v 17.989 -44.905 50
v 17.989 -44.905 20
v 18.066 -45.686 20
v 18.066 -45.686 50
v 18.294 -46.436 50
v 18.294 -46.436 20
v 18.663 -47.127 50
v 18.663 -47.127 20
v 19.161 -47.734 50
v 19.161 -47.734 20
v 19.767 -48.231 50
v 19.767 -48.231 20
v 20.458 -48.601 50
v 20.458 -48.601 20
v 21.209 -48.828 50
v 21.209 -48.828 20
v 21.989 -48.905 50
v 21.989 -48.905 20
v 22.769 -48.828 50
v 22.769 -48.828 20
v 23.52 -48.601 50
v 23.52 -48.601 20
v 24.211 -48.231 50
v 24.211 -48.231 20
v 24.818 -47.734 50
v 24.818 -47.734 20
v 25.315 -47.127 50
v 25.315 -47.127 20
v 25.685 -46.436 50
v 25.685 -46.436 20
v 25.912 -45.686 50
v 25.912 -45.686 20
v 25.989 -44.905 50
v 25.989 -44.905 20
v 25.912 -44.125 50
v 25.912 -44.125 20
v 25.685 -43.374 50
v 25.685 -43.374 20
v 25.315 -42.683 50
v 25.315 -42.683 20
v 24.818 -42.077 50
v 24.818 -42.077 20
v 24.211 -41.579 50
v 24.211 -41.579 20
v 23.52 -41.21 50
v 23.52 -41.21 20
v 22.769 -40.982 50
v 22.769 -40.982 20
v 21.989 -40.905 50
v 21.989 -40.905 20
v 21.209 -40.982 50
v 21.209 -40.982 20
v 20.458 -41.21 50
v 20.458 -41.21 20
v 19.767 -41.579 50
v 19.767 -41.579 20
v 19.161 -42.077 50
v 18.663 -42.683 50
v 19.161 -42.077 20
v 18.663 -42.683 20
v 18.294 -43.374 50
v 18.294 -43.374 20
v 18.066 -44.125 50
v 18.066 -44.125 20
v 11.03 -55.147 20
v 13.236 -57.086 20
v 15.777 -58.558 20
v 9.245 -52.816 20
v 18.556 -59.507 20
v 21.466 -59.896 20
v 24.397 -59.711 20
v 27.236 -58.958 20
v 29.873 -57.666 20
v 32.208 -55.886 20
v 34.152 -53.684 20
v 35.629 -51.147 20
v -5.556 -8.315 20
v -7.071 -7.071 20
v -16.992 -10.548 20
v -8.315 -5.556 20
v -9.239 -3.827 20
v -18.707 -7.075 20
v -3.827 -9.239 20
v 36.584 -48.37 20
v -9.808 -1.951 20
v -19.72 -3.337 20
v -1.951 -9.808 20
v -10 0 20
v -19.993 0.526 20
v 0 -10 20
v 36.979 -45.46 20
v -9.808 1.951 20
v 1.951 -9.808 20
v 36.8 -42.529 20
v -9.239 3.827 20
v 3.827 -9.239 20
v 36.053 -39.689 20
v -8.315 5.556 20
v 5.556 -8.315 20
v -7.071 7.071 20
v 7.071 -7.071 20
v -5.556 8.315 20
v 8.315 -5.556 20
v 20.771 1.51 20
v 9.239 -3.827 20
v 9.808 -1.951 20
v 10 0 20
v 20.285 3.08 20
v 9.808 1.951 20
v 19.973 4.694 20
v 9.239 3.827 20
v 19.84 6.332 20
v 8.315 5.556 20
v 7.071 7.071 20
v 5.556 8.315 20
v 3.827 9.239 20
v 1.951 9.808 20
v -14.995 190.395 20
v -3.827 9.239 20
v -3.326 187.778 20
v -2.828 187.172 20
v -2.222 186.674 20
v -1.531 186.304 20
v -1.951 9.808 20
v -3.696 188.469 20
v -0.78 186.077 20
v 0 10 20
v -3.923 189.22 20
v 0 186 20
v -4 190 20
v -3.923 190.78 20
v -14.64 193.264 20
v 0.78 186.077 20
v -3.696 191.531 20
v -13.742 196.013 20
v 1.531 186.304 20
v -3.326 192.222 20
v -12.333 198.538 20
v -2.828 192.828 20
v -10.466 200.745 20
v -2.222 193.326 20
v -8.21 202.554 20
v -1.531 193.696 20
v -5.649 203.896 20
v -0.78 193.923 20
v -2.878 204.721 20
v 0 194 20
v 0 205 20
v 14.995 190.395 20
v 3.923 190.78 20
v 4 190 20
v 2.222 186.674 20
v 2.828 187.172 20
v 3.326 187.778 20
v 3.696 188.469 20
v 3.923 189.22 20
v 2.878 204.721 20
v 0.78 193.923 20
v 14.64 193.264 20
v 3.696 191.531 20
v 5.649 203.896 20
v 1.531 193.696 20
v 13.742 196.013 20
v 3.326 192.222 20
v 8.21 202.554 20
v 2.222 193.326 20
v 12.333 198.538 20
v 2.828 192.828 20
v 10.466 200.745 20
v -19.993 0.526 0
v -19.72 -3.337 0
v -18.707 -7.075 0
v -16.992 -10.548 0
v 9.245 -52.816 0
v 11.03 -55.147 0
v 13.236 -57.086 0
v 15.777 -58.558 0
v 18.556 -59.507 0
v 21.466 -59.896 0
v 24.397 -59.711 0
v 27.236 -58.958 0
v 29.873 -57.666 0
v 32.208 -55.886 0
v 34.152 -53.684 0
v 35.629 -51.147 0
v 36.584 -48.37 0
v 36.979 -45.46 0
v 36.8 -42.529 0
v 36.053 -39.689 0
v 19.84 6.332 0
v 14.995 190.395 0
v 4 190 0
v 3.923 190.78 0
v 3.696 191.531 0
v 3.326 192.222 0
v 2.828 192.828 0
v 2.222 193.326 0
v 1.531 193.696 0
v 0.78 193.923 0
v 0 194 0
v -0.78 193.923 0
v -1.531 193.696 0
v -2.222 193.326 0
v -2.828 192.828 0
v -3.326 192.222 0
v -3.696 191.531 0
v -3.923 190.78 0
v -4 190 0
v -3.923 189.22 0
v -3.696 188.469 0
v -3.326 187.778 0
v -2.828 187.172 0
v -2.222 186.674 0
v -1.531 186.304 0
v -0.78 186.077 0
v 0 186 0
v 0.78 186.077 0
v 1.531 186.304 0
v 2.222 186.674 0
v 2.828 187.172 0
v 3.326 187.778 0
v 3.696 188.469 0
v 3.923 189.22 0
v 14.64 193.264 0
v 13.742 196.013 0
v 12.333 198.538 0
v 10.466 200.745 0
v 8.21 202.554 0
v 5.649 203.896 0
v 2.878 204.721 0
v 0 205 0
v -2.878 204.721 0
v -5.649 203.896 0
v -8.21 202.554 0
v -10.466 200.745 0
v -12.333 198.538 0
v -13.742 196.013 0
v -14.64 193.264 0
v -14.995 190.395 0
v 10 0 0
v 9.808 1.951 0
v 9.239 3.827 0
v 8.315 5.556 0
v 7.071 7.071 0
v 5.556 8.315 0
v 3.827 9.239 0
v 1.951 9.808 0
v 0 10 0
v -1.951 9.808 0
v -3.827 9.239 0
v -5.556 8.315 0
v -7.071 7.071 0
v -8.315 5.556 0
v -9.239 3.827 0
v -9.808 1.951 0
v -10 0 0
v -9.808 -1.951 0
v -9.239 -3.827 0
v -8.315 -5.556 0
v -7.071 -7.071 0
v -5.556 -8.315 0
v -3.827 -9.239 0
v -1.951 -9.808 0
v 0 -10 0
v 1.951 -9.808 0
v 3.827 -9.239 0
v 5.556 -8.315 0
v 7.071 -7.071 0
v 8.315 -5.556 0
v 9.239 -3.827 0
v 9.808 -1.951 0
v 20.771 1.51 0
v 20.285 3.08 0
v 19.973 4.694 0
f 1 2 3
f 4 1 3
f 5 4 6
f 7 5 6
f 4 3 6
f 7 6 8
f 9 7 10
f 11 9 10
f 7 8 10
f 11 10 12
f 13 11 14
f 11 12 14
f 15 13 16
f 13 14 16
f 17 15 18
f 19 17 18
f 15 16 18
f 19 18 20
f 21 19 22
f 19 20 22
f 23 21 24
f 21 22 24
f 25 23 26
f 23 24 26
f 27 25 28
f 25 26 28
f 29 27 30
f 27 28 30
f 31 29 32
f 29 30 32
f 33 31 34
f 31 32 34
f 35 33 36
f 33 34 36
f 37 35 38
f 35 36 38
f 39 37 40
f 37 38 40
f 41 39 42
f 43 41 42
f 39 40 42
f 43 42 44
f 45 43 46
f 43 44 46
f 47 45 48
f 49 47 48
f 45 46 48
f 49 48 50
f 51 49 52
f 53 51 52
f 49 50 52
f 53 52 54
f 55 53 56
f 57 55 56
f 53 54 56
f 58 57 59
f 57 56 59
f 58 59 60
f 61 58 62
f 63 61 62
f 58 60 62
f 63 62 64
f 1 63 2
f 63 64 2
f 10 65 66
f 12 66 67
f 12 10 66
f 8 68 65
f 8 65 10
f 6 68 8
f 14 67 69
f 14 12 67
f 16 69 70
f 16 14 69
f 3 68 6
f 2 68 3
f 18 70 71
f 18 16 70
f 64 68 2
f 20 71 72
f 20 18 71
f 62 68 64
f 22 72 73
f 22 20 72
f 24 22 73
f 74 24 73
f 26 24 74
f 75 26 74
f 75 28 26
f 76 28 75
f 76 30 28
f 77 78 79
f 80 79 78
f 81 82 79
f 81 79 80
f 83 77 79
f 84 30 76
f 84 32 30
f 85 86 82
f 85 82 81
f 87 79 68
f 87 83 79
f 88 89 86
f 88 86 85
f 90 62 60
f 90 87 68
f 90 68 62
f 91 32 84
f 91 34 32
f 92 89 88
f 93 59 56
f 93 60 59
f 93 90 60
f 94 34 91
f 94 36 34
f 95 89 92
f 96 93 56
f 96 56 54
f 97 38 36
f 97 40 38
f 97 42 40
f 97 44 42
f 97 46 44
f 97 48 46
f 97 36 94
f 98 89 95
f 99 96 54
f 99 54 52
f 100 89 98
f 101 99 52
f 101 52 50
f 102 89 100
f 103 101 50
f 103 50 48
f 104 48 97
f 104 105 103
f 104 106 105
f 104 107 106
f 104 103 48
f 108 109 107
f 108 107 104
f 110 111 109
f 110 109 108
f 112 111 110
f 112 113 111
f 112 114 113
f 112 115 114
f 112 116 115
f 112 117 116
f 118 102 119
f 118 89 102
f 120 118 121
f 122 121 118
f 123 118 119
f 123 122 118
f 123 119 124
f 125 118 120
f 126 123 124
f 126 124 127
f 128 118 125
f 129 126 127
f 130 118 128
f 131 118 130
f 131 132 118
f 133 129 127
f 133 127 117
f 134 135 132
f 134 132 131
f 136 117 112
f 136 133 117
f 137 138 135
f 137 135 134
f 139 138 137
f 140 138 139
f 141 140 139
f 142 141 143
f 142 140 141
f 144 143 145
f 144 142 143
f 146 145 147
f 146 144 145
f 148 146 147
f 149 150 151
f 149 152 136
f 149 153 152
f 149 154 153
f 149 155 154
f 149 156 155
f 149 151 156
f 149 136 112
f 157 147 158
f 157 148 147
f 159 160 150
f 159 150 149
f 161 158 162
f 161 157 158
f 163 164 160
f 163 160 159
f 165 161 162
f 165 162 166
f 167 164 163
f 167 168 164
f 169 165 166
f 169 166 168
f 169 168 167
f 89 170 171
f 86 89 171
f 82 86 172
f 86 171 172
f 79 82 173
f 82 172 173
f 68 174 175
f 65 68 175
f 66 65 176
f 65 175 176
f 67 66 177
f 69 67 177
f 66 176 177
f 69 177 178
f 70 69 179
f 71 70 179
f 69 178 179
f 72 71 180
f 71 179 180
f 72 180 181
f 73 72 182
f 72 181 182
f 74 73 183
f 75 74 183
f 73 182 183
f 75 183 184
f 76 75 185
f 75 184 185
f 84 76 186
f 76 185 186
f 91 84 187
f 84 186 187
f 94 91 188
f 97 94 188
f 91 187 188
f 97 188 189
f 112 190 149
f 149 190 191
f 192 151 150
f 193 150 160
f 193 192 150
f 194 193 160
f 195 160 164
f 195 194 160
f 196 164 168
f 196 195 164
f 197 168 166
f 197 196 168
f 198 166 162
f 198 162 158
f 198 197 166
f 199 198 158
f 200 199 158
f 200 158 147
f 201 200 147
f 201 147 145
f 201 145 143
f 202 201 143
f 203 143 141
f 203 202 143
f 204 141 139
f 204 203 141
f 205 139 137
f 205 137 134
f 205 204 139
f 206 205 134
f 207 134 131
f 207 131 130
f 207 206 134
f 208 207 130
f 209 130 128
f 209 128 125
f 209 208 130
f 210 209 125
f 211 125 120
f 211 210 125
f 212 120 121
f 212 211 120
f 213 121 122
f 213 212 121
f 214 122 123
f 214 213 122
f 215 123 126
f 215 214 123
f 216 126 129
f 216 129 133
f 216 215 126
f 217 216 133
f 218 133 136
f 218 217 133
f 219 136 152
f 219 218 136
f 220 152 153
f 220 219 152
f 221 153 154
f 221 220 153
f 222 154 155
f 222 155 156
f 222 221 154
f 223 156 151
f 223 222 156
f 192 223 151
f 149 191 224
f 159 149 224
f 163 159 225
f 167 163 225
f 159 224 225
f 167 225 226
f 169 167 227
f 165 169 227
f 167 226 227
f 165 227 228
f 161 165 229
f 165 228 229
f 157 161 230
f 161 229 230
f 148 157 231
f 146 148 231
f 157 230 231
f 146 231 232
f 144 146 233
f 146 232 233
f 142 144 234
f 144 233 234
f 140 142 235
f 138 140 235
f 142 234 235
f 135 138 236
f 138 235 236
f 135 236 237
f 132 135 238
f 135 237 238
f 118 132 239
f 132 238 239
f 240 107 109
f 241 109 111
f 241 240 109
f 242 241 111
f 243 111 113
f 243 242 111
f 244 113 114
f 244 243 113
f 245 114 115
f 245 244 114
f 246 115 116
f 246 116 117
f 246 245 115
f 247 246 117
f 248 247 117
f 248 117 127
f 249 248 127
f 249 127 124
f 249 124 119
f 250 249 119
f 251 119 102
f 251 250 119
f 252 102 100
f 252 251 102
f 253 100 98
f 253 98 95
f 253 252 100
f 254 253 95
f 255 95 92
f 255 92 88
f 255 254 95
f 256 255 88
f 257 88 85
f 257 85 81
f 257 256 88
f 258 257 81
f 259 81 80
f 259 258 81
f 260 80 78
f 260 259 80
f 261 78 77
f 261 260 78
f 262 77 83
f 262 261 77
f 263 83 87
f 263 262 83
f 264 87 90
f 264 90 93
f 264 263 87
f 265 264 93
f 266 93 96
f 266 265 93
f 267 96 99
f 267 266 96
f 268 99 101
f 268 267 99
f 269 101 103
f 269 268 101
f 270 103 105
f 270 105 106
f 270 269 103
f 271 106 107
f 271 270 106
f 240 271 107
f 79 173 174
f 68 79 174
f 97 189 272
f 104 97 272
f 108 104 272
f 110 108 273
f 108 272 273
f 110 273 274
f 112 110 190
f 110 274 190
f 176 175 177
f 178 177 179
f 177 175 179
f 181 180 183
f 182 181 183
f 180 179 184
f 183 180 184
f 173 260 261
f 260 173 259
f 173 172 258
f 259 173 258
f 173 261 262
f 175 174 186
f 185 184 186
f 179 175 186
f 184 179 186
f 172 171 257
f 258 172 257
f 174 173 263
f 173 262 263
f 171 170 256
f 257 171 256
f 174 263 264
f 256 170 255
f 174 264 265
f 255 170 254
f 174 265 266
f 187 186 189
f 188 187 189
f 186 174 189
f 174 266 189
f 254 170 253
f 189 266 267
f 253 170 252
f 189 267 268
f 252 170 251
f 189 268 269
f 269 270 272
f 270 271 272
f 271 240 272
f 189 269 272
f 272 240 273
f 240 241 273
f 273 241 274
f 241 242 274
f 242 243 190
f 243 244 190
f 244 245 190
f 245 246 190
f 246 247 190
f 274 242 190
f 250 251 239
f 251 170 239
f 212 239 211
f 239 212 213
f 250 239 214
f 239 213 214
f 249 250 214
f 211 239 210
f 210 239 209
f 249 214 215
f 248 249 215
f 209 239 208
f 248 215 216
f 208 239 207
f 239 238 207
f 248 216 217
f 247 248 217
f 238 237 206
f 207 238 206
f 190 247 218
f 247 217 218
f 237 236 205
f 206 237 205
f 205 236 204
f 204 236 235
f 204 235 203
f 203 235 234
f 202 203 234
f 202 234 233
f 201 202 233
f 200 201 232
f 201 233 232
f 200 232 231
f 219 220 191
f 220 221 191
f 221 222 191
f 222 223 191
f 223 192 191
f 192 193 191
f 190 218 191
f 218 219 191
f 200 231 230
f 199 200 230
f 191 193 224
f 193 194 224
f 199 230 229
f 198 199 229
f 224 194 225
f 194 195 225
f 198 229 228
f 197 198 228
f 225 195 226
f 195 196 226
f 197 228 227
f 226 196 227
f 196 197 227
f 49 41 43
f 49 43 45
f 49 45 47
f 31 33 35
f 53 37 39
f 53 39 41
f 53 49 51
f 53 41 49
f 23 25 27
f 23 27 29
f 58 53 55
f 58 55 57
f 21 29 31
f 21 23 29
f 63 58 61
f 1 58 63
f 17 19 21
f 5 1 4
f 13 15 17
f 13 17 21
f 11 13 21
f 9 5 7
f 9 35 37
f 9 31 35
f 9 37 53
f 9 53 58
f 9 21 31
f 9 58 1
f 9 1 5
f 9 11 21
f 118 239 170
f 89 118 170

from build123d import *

# Parameters (mm, degrees)
SKETCH_1_R      = 4
SKETCH_1_R_2    = 10
EXTRUDE_1_DEPTH = 20
SKETCH_2_R      = 4
EXTRUDE_2_DEPTH = 30


with BuildPart() as part:
    # 草图1 → 凸台-拉伸1 (new body)
    with BuildSketch(Plane.XY):
        with BuildLine():
            Line((-14.994805195, 190.394736842), (-19.993073593, 0.526315789))
            ThreePointArc((-19.993073593, 0.526315789), (-19.303930684, -5.230512418), (-16.992485973, -10.547768506))
            Line((-16.992485973, -10.547768506), (9.244756909, -52.816043677))
            ThreePointArc((9.244756909, -52.816043677), (28.585857805, -58.376782487), (36.052833152, -39.688703956))
            Line((36.052833152, -39.688703956), (20.771333694, 1.510194546))
            ThreePointArc((20.771333694, 1.510194546), (20.107121839, 3.882720212), (19.840240262, 6.331971045))
            Line((19.840240262, 6.331971045), (14.994805195, 190.394736842))
            ThreePointArc((14.994805195, 190.394736842), (0, 205), (-14.994805195, 190.394736842))
        make_face()
        with Locations((0, 190)):
            Circle(SKETCH_1_R, mode=Mode.SUBTRACT)
        Circle(SKETCH_1_R_2, mode=Mode.SUBTRACT)
    extrude(amount=EXTRUDE_1_DEPTH)

    # 草图2 → 凸台-拉伸2 (add)
    with BuildSketch(Plane.XY.offset(20)):
        with Locations(Location((21.989121389, -44.905217298, 0), (0, 0, 180))):
            Circle(SKETCH_2_R)
    extrude(amount=EXTRUDE_2_DEPTH)


solid = part.part
